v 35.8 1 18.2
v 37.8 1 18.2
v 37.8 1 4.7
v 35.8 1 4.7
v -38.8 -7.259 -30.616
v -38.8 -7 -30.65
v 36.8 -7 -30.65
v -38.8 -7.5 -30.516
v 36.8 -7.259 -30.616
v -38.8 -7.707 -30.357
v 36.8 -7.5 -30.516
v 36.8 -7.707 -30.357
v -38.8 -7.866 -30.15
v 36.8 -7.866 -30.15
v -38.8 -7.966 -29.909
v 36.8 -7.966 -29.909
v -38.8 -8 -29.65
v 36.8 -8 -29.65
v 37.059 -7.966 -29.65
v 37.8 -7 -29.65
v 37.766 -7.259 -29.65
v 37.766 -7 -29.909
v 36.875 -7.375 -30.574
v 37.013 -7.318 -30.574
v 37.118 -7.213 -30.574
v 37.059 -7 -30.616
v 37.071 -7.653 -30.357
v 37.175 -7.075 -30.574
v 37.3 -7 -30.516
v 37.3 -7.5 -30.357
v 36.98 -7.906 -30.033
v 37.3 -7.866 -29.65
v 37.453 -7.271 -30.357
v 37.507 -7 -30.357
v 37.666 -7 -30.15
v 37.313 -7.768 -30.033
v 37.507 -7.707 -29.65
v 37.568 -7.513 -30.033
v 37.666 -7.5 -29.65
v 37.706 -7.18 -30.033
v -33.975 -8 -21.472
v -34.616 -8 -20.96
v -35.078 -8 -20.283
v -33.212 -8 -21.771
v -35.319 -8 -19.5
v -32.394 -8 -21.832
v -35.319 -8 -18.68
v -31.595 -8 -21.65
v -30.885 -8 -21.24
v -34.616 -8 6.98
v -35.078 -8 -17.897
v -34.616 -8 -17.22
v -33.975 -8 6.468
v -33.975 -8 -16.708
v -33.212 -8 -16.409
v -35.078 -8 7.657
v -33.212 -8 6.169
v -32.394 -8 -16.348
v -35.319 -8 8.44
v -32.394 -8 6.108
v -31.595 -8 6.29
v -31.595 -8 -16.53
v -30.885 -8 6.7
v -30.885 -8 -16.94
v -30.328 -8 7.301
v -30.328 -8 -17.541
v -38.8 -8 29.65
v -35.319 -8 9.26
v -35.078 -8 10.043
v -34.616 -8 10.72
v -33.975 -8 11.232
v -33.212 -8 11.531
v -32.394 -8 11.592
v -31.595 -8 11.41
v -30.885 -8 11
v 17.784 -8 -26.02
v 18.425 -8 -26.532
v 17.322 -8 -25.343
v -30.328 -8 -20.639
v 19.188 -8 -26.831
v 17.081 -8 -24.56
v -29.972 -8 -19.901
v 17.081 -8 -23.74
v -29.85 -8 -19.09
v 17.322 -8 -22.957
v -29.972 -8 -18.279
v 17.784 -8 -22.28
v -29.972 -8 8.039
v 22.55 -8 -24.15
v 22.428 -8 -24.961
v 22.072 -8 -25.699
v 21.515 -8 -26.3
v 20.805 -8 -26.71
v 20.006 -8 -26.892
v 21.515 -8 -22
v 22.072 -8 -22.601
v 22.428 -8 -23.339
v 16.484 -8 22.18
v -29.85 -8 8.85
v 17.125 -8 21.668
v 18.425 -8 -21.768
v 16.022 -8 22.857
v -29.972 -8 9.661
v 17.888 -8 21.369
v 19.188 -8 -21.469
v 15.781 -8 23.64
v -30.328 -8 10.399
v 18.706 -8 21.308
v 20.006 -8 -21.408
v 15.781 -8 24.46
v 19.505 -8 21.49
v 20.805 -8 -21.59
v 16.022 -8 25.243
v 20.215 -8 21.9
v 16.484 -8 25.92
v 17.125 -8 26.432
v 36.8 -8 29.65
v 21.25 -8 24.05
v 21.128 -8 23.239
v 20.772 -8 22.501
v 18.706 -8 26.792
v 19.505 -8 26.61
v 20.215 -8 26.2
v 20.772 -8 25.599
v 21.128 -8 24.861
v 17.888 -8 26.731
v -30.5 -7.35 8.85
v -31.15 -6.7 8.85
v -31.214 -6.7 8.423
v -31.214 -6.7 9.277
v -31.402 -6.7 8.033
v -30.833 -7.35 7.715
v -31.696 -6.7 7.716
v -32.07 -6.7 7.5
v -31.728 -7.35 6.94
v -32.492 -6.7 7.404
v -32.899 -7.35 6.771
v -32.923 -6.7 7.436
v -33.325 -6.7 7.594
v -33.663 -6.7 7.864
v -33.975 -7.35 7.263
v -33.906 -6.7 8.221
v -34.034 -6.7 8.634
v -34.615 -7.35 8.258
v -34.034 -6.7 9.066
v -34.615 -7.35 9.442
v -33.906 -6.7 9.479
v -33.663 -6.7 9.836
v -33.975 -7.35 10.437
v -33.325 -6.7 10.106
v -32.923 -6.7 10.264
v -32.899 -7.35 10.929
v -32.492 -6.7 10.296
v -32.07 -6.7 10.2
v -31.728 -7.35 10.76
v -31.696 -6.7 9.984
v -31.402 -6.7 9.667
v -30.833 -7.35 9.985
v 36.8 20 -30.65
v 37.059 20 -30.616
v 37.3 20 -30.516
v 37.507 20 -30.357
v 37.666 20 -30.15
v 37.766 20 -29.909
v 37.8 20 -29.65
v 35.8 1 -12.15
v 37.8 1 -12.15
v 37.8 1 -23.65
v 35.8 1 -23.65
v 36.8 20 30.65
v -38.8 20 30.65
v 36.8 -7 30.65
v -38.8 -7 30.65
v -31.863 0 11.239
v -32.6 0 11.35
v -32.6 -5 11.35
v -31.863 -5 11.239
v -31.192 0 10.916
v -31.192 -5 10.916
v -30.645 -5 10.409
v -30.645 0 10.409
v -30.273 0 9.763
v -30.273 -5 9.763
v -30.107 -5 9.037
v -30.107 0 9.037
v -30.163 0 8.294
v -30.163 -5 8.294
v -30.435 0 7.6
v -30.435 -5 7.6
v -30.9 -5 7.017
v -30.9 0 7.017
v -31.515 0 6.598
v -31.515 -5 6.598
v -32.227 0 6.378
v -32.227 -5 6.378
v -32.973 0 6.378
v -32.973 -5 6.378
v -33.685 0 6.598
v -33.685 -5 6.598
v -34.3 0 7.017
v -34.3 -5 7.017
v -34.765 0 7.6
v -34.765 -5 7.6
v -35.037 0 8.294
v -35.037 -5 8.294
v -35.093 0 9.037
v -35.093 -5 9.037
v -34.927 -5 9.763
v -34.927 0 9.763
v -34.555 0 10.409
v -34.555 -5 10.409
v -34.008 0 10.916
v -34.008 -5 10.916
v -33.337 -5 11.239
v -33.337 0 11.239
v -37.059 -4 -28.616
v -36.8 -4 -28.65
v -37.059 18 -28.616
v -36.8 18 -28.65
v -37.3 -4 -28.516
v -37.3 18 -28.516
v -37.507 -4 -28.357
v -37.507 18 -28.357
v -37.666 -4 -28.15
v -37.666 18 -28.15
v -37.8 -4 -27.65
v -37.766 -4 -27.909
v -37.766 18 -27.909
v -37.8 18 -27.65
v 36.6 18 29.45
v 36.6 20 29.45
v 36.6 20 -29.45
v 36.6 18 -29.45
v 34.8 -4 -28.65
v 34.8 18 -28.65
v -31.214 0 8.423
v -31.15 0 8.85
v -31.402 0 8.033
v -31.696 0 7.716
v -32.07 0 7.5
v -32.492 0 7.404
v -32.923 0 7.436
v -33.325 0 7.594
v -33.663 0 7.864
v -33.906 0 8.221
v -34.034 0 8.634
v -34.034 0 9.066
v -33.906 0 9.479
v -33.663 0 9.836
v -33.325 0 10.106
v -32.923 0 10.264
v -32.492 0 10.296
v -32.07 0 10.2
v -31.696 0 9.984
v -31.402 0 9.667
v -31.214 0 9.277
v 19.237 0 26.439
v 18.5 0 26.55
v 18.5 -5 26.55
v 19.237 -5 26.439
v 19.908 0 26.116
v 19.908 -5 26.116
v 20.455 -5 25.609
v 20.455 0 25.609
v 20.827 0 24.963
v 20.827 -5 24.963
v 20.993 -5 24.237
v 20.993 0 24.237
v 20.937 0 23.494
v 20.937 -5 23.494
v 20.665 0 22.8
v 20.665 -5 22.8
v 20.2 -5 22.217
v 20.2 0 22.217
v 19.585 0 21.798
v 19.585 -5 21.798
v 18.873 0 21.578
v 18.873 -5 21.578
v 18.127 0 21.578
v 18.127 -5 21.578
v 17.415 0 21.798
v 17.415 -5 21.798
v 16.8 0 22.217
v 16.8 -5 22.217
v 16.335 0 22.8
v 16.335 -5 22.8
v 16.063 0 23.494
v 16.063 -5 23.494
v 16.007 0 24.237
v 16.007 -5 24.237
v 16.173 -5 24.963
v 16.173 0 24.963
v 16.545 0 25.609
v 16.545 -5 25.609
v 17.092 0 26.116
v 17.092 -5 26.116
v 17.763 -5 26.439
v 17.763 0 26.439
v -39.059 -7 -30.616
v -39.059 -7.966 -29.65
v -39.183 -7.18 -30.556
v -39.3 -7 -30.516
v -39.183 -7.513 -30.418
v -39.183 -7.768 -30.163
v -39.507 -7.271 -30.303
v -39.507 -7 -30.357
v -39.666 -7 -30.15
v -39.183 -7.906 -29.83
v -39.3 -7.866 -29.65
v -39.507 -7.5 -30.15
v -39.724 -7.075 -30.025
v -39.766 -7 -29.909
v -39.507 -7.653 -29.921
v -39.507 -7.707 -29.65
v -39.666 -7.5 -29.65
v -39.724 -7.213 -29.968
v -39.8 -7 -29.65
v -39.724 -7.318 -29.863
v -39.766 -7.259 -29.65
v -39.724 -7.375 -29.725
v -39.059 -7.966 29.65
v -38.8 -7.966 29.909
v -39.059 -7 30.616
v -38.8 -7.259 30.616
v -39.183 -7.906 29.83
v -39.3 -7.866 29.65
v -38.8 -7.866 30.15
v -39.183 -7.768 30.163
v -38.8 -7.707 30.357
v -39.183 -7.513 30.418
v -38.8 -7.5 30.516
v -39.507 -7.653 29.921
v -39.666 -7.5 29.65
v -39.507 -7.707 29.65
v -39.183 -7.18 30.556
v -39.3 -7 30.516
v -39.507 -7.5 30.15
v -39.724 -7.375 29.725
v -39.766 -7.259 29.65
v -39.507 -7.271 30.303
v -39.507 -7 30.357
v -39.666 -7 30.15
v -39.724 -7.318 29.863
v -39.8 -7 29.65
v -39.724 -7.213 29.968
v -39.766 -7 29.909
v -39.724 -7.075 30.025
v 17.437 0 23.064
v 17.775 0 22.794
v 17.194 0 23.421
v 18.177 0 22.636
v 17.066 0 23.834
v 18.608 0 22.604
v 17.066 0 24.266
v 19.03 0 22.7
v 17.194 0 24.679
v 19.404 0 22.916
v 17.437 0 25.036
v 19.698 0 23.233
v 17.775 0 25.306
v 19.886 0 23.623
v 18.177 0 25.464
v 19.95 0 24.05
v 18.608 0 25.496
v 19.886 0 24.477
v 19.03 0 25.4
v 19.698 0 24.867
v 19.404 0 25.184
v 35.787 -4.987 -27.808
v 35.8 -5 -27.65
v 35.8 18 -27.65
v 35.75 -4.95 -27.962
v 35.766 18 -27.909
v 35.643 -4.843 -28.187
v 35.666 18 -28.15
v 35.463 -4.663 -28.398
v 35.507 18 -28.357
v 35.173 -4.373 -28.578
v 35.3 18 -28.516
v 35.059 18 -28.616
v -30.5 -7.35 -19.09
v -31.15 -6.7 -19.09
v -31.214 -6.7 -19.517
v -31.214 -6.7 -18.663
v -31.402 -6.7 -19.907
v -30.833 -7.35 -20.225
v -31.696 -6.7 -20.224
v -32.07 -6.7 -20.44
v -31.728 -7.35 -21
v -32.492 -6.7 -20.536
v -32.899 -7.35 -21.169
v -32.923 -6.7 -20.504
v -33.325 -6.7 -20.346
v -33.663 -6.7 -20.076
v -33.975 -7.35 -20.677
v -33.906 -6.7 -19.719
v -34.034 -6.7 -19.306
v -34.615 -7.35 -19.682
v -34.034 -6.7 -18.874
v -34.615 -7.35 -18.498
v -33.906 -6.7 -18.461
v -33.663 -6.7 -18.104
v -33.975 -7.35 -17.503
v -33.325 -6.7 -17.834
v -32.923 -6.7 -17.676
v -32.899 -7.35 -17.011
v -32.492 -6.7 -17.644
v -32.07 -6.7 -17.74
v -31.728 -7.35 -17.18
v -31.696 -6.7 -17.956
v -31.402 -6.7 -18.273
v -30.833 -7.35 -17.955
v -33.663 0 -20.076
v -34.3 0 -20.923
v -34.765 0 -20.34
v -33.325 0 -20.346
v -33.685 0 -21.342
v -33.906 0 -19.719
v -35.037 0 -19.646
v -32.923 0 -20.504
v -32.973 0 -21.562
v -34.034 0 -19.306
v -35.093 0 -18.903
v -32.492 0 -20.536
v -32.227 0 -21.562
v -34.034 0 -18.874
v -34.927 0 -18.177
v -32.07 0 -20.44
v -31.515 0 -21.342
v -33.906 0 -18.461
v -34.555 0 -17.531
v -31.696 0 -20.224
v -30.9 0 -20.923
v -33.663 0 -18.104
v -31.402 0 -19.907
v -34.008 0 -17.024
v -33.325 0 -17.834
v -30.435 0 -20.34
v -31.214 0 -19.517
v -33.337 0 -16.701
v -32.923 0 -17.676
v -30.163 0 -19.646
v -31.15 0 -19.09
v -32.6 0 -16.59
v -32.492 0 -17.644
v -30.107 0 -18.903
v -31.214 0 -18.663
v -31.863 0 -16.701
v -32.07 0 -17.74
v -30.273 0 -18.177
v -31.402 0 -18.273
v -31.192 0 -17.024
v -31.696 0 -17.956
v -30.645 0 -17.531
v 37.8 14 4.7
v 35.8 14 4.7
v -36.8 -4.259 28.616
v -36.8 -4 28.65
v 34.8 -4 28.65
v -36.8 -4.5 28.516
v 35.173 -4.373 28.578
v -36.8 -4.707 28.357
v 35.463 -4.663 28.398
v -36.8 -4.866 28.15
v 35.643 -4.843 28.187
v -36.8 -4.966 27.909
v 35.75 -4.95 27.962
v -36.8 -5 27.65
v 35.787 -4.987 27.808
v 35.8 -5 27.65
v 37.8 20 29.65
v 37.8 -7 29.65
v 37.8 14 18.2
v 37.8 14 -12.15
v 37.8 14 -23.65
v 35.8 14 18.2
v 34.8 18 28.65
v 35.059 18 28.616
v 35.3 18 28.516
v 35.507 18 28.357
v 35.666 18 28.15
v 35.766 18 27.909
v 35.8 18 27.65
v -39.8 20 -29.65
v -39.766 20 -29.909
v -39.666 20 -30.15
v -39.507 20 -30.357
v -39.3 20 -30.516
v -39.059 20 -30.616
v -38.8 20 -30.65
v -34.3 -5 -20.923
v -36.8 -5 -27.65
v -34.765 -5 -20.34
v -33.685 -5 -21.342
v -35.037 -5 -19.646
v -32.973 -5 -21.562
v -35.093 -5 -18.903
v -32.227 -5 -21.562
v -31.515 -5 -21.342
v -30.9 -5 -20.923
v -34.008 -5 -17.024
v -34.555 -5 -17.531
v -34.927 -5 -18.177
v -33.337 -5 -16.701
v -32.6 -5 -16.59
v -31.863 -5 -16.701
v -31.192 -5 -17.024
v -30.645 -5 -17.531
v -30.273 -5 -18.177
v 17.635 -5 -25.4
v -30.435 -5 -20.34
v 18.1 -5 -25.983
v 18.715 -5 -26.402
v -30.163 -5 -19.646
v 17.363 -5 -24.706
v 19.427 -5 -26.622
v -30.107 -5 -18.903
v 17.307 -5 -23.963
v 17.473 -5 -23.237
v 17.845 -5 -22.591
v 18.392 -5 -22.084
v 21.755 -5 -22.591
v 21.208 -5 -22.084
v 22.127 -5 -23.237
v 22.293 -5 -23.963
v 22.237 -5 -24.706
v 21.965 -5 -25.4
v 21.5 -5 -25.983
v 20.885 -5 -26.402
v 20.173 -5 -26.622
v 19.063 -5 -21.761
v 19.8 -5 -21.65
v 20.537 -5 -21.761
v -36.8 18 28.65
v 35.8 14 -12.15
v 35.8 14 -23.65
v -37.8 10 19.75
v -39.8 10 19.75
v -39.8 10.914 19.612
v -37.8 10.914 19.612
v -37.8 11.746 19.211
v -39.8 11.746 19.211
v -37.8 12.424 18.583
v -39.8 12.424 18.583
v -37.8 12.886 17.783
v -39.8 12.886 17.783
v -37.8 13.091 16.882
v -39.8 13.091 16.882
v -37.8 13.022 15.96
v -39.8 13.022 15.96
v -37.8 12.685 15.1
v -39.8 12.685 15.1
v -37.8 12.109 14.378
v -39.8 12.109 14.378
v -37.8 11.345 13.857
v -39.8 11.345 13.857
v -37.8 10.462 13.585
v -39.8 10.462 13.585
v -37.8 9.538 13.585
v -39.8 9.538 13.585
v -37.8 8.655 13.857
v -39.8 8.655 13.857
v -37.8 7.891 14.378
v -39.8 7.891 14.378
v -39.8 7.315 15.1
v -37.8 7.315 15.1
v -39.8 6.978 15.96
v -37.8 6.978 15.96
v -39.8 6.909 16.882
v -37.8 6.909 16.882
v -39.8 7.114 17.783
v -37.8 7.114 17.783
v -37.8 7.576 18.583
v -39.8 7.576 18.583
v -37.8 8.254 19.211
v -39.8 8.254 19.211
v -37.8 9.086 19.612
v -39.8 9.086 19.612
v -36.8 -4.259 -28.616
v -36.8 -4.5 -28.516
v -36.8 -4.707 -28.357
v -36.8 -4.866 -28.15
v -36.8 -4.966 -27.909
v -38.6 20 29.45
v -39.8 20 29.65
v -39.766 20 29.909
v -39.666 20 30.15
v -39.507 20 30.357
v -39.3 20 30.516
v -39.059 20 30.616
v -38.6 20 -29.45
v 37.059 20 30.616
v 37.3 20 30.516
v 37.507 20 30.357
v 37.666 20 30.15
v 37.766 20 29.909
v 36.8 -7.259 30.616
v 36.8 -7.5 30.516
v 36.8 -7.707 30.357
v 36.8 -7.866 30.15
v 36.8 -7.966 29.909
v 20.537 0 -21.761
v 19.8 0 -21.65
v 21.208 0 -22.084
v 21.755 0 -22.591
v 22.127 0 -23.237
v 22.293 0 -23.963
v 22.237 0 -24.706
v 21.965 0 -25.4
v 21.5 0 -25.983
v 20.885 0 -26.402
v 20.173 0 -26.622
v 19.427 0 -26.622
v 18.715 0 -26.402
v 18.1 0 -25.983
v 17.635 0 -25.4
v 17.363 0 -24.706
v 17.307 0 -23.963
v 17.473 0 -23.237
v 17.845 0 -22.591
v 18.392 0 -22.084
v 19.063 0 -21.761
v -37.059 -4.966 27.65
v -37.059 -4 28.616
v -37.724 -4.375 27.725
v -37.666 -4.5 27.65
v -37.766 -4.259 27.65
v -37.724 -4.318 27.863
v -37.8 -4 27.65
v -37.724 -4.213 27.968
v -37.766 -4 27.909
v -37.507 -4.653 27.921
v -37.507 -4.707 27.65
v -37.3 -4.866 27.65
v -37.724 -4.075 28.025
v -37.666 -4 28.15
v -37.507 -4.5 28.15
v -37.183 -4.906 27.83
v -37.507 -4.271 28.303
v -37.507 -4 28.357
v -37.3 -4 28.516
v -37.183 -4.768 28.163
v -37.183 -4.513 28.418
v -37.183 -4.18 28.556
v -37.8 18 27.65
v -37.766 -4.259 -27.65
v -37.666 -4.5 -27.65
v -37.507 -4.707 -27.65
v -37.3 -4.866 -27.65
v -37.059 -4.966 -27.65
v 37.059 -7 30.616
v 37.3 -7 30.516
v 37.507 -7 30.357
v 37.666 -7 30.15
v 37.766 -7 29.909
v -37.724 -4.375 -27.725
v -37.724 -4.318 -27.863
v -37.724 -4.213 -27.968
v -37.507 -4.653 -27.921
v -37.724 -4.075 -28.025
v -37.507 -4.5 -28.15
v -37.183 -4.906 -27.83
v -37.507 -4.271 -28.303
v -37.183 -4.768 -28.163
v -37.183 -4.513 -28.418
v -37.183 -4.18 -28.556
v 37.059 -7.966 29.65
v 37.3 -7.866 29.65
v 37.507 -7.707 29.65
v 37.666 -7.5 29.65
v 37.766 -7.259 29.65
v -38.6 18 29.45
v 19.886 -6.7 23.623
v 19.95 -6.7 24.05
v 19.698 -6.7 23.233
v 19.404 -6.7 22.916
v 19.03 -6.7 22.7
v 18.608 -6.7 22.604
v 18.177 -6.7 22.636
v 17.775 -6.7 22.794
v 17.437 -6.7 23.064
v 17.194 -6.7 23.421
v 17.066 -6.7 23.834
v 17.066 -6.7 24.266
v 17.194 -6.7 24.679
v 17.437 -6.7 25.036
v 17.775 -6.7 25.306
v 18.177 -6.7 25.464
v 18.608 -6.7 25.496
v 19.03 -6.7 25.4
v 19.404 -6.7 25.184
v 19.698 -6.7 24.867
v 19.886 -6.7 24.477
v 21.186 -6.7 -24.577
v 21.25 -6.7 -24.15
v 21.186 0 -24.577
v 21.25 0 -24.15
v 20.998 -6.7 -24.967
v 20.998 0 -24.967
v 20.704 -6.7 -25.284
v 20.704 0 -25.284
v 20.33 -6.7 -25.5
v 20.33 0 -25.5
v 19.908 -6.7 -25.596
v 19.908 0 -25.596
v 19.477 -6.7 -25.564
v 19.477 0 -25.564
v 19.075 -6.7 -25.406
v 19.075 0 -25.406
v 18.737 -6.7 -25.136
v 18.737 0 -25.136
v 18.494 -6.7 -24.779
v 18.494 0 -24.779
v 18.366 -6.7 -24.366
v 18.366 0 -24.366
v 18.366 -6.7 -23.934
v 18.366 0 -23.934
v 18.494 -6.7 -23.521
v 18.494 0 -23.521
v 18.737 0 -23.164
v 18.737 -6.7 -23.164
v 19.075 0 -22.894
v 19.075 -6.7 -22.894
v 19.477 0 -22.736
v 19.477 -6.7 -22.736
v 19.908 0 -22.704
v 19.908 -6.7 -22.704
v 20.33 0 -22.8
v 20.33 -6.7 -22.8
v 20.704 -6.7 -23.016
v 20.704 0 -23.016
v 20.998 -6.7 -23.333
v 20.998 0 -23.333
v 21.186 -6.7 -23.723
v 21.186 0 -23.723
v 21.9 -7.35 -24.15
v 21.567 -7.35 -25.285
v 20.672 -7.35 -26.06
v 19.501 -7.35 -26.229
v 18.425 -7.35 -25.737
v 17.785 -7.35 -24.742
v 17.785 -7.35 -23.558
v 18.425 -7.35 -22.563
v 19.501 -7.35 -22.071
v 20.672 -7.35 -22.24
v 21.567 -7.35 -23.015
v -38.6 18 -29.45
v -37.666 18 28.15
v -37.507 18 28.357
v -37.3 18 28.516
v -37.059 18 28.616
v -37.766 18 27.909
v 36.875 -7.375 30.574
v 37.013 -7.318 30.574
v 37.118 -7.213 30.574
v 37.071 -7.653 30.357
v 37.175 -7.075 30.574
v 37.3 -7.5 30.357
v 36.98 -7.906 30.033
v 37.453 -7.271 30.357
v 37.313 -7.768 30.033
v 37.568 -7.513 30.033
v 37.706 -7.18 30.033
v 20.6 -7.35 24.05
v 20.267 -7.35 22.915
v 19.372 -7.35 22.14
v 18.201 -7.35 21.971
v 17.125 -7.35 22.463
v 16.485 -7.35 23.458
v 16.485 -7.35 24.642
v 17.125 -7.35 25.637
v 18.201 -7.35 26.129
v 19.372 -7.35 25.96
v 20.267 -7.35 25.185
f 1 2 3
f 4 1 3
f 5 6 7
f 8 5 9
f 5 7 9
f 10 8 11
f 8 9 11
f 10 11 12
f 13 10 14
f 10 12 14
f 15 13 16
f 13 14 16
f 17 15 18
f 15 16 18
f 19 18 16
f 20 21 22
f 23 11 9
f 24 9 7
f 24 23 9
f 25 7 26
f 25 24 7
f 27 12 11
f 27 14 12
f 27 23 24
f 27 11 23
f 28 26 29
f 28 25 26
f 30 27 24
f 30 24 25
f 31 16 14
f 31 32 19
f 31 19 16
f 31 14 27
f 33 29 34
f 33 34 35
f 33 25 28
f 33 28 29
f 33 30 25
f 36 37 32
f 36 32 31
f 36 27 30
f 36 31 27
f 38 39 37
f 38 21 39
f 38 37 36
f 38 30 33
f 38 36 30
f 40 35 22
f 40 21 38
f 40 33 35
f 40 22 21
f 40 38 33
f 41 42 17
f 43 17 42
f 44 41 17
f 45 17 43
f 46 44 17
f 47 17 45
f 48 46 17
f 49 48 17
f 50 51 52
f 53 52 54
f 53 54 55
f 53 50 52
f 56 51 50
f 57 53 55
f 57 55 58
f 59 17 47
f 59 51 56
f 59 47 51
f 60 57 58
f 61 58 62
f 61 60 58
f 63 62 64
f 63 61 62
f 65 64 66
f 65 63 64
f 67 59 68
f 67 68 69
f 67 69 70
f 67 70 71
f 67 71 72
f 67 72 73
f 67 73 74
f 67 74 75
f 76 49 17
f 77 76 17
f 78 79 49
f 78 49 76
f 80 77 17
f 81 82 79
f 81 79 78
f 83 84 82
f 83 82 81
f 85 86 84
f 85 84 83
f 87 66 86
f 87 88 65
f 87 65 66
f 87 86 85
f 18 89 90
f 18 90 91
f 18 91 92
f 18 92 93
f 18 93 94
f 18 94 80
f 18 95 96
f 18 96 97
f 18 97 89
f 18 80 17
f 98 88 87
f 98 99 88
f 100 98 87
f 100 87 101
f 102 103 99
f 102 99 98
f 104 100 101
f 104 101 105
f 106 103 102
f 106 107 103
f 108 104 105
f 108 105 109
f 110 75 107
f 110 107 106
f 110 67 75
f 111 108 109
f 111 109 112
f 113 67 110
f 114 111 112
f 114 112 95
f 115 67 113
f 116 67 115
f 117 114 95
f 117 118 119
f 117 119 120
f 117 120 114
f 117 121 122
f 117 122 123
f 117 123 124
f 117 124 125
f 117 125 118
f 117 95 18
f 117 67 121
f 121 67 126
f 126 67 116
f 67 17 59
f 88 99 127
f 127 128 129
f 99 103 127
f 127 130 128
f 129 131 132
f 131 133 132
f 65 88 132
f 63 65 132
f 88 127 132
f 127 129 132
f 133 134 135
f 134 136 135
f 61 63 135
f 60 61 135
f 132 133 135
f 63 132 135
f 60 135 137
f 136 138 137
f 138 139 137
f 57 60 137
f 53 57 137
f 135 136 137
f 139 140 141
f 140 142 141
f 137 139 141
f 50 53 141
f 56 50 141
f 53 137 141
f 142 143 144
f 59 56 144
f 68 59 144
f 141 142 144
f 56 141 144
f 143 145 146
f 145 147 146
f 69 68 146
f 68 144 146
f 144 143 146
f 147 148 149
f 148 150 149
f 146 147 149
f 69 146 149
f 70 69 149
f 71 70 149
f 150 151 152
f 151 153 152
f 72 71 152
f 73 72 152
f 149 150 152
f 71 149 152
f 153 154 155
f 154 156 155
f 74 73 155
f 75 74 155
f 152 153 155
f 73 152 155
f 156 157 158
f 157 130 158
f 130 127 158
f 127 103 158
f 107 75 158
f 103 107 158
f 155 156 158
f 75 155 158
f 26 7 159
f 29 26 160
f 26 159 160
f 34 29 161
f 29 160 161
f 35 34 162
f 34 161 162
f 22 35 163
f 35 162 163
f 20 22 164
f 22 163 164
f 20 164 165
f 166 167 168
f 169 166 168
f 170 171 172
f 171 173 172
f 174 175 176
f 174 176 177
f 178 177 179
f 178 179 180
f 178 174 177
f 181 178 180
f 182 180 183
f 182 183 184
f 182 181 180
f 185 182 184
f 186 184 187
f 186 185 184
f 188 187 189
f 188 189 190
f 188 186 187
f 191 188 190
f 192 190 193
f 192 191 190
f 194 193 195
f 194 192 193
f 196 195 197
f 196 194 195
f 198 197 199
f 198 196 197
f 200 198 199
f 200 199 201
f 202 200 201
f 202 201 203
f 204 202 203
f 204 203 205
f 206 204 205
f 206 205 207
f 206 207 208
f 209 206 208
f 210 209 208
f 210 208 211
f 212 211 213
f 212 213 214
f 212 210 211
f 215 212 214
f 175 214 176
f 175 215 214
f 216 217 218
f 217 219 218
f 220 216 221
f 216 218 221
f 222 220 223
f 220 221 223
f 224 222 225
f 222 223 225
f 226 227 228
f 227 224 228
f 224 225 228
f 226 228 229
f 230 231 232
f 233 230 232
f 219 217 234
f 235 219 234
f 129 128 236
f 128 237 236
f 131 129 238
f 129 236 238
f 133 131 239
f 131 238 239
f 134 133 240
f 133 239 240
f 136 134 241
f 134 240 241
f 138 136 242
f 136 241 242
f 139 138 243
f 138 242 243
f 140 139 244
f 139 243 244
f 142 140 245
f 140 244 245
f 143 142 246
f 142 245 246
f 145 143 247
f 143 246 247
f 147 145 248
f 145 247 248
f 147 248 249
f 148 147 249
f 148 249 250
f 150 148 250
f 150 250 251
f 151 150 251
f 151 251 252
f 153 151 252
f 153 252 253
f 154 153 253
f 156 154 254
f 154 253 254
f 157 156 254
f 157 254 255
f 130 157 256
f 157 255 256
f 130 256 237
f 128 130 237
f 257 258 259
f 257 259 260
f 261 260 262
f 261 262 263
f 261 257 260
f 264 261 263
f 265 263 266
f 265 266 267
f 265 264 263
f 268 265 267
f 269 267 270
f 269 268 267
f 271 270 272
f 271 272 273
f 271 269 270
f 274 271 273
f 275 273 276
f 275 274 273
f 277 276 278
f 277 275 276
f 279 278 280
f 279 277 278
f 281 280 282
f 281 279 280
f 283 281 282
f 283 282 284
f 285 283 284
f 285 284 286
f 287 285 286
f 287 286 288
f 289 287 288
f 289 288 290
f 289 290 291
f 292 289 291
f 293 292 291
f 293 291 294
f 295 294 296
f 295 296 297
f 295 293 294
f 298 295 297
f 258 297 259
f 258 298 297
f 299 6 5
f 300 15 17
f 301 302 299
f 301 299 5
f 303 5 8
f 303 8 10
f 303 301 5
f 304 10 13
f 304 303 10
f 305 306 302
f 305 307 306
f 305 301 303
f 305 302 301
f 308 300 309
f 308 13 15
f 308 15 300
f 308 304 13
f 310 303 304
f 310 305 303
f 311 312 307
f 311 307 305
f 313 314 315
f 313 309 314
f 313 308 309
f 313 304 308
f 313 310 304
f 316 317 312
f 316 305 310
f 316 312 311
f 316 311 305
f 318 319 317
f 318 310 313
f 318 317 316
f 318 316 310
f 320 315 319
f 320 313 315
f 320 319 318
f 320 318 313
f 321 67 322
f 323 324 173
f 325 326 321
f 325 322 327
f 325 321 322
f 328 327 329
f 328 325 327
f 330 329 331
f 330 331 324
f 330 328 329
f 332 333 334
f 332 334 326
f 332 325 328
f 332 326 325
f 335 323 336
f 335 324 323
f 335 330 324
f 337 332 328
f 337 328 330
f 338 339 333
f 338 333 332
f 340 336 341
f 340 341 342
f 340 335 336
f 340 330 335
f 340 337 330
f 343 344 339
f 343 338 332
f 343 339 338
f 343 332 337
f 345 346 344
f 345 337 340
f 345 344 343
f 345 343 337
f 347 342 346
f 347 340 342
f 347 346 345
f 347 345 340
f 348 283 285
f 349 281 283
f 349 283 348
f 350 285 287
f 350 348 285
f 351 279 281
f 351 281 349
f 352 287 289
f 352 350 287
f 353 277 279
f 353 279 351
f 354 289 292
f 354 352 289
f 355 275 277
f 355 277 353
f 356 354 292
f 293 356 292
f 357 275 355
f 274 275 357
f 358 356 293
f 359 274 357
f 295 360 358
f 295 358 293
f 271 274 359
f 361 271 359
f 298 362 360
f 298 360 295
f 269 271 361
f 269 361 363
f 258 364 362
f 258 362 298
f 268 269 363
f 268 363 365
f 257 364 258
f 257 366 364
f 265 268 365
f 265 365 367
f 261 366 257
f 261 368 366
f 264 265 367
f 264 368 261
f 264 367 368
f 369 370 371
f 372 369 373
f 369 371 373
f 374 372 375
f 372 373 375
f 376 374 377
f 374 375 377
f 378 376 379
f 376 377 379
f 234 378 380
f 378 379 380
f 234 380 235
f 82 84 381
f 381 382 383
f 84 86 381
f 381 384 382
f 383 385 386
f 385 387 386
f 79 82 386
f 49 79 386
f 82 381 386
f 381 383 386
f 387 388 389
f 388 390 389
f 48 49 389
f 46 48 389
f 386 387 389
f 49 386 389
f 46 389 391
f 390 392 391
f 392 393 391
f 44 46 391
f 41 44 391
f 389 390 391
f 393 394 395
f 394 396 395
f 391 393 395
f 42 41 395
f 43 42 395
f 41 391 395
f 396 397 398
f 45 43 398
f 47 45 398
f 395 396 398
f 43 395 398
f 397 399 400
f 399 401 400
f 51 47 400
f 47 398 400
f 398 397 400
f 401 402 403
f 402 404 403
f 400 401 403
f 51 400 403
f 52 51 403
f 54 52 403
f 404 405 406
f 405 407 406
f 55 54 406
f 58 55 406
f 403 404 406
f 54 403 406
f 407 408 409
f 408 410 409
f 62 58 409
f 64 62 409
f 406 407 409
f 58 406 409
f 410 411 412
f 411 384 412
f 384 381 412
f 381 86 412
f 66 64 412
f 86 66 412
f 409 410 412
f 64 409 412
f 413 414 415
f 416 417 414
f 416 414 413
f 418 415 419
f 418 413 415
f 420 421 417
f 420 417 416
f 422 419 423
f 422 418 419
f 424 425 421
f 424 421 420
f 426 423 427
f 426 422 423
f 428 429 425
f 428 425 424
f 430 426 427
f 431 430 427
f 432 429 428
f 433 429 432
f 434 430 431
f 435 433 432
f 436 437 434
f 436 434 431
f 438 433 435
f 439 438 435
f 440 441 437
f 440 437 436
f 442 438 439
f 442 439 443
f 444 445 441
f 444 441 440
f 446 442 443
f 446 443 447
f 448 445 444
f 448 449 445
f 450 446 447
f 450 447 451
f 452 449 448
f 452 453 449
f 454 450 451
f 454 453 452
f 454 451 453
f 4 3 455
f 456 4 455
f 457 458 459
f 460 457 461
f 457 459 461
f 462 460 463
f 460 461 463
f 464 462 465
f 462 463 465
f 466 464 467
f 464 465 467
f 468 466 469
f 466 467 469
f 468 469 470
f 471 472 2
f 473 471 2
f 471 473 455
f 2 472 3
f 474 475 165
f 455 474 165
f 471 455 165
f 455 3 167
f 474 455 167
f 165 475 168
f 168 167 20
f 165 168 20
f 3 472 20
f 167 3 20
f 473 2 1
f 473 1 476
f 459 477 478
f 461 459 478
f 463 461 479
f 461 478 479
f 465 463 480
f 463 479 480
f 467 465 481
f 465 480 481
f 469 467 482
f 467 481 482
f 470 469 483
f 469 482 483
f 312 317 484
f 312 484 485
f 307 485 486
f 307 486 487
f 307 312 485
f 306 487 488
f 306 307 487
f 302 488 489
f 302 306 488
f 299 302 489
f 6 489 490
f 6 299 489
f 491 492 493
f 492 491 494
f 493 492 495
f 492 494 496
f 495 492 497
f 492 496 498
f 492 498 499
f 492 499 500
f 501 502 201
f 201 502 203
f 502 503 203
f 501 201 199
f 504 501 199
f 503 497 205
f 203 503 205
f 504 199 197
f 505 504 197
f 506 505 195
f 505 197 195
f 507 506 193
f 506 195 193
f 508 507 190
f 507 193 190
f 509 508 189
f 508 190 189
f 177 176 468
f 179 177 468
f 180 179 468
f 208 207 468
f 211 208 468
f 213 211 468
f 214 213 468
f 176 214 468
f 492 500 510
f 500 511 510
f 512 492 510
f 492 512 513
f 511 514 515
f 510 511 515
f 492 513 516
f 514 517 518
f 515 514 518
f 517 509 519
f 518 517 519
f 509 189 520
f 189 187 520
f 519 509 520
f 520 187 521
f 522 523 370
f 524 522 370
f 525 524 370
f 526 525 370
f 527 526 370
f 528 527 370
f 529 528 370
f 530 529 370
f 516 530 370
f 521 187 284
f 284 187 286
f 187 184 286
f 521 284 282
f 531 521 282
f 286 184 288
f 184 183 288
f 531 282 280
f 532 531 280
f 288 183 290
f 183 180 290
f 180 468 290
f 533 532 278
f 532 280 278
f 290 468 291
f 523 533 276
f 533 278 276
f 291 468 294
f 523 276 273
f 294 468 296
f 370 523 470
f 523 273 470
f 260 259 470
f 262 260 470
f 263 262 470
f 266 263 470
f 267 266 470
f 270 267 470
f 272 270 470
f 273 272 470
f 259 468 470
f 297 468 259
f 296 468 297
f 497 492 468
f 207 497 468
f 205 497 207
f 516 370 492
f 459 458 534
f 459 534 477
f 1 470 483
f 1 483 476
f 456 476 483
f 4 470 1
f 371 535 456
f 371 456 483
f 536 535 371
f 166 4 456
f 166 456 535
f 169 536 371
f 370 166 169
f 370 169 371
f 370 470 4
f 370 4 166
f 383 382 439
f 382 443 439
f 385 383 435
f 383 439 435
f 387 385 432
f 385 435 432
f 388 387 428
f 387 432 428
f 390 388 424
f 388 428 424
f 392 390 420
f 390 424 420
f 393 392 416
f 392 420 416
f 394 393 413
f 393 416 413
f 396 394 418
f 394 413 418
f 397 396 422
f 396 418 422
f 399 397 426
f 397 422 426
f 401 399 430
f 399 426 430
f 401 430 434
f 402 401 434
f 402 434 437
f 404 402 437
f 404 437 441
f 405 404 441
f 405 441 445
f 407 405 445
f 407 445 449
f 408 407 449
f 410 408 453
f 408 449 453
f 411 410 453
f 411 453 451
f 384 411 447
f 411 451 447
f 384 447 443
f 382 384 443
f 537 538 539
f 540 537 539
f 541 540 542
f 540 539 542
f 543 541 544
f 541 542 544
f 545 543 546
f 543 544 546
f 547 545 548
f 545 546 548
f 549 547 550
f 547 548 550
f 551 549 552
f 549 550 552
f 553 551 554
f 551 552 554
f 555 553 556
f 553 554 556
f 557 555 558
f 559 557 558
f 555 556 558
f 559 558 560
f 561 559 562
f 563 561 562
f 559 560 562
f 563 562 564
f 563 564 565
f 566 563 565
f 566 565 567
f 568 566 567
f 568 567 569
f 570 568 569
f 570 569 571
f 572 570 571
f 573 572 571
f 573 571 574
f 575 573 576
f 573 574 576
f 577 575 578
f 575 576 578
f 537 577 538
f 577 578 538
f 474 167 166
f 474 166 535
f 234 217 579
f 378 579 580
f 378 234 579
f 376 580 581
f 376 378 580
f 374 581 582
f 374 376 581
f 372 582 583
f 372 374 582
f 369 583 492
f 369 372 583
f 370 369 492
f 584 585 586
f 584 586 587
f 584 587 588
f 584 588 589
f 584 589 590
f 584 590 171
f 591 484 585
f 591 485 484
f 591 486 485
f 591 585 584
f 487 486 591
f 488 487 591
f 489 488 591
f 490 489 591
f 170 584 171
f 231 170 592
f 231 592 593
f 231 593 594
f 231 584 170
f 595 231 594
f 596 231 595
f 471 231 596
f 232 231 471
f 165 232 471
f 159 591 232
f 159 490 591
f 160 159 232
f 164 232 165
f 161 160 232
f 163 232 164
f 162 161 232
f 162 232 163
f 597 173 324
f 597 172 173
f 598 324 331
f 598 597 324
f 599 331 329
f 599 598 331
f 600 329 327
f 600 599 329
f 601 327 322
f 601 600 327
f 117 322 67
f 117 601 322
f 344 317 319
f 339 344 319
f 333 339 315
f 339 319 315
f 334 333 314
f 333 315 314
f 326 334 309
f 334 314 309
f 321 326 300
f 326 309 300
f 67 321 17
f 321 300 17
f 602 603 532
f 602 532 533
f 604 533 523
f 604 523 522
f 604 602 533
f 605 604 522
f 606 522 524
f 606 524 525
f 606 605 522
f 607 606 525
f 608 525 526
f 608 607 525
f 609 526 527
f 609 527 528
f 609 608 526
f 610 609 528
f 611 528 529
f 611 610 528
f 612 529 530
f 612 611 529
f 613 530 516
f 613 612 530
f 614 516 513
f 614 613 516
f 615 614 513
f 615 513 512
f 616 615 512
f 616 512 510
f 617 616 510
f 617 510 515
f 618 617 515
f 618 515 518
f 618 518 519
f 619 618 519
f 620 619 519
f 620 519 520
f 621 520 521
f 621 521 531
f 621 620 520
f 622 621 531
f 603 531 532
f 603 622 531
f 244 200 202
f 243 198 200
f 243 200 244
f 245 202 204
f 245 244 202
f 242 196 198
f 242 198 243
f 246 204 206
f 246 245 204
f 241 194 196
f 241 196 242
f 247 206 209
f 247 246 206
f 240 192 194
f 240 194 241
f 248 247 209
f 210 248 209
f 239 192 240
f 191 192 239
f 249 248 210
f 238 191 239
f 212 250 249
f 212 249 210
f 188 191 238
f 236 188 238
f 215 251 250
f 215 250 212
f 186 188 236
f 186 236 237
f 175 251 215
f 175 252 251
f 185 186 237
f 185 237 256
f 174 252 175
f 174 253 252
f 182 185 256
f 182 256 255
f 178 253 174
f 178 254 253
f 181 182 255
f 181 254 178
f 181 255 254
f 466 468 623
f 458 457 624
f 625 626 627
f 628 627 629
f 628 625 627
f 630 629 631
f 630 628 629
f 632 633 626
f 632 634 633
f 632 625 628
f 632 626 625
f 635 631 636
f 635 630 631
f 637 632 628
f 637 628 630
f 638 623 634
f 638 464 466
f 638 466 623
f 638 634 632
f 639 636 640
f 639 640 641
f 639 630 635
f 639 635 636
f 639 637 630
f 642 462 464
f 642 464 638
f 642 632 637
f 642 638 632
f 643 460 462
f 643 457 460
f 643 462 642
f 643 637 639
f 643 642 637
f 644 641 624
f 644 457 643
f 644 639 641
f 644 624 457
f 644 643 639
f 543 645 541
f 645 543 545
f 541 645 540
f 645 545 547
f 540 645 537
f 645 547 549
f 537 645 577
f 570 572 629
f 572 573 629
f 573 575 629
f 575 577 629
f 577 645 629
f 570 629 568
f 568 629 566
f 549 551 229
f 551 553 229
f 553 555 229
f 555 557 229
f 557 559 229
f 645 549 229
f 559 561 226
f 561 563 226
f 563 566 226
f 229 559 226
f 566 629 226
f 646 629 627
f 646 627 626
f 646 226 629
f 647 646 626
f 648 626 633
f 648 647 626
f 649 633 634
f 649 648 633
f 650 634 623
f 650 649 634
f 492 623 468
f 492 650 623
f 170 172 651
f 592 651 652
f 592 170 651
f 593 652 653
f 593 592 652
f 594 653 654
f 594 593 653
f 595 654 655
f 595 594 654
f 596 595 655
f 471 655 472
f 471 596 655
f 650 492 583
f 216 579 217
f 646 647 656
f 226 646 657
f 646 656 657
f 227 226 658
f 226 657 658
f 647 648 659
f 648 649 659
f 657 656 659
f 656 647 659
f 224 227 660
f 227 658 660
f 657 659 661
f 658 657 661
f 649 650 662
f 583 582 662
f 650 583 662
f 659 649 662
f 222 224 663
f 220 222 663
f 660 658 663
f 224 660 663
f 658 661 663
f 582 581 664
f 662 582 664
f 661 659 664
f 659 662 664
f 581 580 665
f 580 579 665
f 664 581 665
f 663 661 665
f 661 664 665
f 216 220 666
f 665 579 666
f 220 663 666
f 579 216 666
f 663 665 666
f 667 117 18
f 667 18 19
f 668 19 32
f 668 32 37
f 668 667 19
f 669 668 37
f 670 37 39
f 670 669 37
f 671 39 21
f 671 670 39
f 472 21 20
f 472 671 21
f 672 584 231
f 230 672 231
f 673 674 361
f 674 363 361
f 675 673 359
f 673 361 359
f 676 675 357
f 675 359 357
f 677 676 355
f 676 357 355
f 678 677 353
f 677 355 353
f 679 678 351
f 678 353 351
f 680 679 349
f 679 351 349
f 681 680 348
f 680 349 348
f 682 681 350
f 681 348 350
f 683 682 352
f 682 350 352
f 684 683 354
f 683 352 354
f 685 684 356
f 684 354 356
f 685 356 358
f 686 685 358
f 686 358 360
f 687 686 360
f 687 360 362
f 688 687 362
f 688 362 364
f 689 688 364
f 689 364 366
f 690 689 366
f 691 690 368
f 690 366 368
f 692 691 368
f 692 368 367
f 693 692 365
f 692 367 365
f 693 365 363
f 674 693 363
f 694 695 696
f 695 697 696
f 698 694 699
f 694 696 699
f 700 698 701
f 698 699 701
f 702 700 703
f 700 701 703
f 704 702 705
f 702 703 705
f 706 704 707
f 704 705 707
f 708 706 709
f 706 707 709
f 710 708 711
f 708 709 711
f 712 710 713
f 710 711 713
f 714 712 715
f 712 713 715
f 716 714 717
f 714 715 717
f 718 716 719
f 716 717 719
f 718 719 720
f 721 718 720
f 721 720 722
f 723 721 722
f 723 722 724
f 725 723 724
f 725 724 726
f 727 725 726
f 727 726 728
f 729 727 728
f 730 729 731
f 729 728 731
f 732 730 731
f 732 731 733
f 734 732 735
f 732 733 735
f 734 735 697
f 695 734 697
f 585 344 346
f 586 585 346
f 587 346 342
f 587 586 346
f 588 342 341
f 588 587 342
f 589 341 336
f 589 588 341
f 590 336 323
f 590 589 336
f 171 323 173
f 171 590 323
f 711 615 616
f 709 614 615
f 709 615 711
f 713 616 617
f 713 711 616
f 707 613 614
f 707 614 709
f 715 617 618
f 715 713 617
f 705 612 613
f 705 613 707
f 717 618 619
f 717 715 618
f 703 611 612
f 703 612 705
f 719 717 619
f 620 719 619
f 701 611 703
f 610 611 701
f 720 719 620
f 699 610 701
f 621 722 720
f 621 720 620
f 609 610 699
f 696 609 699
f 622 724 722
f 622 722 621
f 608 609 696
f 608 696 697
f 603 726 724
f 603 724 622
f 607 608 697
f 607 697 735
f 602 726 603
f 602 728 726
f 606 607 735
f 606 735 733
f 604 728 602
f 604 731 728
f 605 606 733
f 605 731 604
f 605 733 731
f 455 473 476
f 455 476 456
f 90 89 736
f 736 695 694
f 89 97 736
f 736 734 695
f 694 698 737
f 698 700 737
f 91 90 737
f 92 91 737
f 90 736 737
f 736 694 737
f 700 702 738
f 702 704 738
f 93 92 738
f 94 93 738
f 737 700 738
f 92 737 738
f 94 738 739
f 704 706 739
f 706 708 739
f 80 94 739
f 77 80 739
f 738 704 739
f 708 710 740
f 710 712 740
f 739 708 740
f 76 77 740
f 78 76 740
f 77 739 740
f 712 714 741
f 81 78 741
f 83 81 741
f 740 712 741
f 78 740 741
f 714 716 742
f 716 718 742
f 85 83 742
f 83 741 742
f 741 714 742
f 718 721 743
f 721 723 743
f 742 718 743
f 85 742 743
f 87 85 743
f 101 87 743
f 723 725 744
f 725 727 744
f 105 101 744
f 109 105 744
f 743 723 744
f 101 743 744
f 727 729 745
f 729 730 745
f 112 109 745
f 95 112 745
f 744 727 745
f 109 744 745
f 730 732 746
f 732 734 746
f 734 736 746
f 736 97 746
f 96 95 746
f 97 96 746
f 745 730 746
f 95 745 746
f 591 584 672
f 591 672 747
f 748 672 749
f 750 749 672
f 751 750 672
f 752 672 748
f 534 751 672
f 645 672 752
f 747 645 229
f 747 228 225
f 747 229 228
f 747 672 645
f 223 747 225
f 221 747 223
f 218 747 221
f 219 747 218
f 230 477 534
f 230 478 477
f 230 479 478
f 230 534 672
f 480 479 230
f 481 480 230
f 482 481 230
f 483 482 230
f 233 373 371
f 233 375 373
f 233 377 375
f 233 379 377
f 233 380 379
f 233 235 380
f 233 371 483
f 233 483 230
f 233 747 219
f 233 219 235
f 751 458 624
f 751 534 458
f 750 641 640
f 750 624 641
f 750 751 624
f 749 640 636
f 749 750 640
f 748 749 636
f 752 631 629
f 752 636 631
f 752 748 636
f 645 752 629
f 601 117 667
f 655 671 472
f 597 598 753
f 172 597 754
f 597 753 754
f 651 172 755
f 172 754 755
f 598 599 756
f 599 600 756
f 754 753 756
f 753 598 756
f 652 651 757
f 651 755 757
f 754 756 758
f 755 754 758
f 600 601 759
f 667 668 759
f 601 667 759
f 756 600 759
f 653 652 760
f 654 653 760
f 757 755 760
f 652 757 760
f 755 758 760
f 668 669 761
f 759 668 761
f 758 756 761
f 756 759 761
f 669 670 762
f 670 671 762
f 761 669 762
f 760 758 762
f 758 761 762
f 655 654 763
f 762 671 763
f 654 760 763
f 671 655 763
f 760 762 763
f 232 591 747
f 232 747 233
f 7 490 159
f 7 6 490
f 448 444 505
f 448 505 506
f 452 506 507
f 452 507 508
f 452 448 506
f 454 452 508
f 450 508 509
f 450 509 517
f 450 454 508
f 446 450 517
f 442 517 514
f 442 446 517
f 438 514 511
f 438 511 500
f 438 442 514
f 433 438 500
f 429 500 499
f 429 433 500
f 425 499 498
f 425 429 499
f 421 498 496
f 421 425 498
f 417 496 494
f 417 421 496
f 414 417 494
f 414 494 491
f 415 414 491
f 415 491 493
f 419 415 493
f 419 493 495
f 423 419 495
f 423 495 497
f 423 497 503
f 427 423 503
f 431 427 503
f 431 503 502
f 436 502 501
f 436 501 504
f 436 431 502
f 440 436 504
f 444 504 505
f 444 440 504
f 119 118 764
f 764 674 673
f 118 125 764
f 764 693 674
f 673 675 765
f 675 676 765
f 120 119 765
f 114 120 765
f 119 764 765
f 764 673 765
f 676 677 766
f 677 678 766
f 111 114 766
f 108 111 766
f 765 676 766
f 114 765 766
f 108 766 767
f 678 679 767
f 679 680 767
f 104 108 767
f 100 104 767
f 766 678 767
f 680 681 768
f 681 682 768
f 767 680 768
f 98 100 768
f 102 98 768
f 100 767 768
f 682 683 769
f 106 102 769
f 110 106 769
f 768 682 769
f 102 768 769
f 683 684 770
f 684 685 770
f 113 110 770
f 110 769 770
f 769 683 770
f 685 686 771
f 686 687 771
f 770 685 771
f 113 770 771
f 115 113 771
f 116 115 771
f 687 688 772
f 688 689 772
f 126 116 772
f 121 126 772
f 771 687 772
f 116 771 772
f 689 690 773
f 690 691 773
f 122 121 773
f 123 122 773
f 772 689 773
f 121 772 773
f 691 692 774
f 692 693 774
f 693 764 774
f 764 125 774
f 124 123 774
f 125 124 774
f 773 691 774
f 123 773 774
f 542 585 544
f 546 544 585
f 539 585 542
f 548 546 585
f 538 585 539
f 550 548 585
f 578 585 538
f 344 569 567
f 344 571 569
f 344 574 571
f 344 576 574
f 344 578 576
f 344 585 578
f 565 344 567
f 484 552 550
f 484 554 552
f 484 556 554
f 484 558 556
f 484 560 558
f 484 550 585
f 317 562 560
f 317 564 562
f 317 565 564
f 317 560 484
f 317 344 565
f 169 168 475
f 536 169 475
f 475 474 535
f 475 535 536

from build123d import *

# Parameters (mm, degrees)
SKETCH1_R                                         = 2.5
BOSS_EXTRUDE1_DEPTH                               = 5
BOSS_EXTRUDE1_2_DEPTH                             = 5
BOSS_EXTRUDE1_3_DEPTH                             = 5
BOSS_EXTRUDE1_4_DEPTH                             = 5
SKETCH3_W                                         = 77.6
SKETCH3_H                                         = 61.3
BOSS_EXTRUDE2_DEPTH                               = 3
SKETCH4_W                                         = 77.6
SKETCH4_H                                         = 61.3
SKETCH4_W_2                                       = 73.6
SKETCH4_H_2                                       = 57.3
BOSS_EXTRUDE3_DEPTH                               = 25
CUT_EXTRUDE2_REACH                                = 87.797
SKETCH5_W                                         = 13.5
SKETCH5_H                                         = 13
SKETCH5_W_2                                       = 11.5
FILLET1_R                                         = 1
SKETCH7_W                                         = 75.2
SKETCH7_H                                         = 58.9
CUT_EXTRUDE3_DEPTH                                = 2
SKETCH2_R                                         = 1
CUT_EXTRUDE1_DEPTH                                = 55.069053071
CSK_FOR_M2_5_FLAT_HEAD_MACHINE_SCREW1_D           = 2.9
CSK_FOR_M2_5_FLAT_HEAD_MACHINE_SCREW1_CSINK_D     = 5.5
CSK_FOR_M2_5_FLAT_HEAD_MACHINE_SCREW1_CSINK_ANGLE = 90
SKETCH12_R                                        = 3.1
CUT_EXTRUDE4_DEPTH                                = 2
FILLET3_R                                         = 1
FILLET4_R                                         = 1


with BuildPart() as part:
    # Sketch1 → Boss-Extrude1 (new body)
    with BuildSketch(Plane(origin=(0, 0, 0), x_dir=(1, 0, 0), z_dir=(0, 1, 0))):
        with Locations(Location((-32.6, 19.09, 0), (0, 0, 270))):
            Circle(SKETCH1_R)
    extrude(amount=-BOSS_EXTRUDE1_DEPTH)



with BuildPart() as body_2:
    # Sketch1 → Boss-Extrude1 2 (new body)
    with BuildSketch(Plane(origin=(0, 0, 0), x_dir=(1, 0, 0), z_dir=(0, 1, 0))):
        with Locations(Location((-32.6, -8.85, 0), (0, 0, 270))):
            Circle(SKETCH1_R)
    extrude(amount=-BOSS_EXTRUDE1_2_DEPTH)


with BuildPart() as body_3:
    # Sketch1 → Boss-Extrude1 3 (new body)
    with BuildSketch(Plane(origin=(0, 0, 0), x_dir=(1, 0, 0), z_dir=(0, 1, 0))):
        with Locations(Location((19.8, 24.15, 0), (0, 0, 270))):
            Circle(SKETCH1_R)
    extrude(amount=-BOSS_EXTRUDE1_3_DEPTH)


with BuildPart() as body_4:
    # Sketch1 → Boss-Extrude1 4 (new body)
    with BuildSketch(Plane(origin=(0, 0, 0), x_dir=(1, 0, 0), z_dir=(0, 1, 0))):
        with Locations(Location((18.5, -24.05, 0), (0, 0, 270))):
            Circle(SKETCH1_R)
    extrude(amount=-BOSS_EXTRUDE1_4_DEPTH)


with BuildPart() as part_1:
    add(part.part)

    add(body_2.part)  # Boss-Extrude2 merges body 2

    add(body_3.part)  # Boss-Extrude2 merges body 3

    add(body_4.part)  # Boss-Extrude2 merges body 4
    # Sketch3 → Boss-Extrude2 (add)
    with BuildSketch(Plane.XZ.offset(5)):
        with Locations((-1, 0)):
            Rectangle(SKETCH3_W, SKETCH3_H)
    extrude(amount=BOSS_EXTRUDE2_DEPTH)

    # Sketch4 → Boss-Extrude3 (add)
    with BuildSketch(Plane(origin=(0, -5, 0), x_dir=(1, 0, 0), z_dir=(0, 1, 0))):
        with Locations((-1, 0)):
            Rectangle(SKETCH4_W, SKETCH4_H)
        with Locations((-1, 0)):
            Rectangle(SKETCH4_W_2, SKETCH4_H_2, mode=Mode.SUBTRACT)
    extrude(amount=BOSS_EXTRUDE3_DEPTH)

    # Sketch5 → Cut-Extrude2 (cut, up to next)
    with BuildSketch(Plane(origin=(37.8, 0, 0), x_dir=(0, 0, -1), z_dir=(1, 0, 0)), mode=Mode.PRIVATE) as cut_extrude2_sk1:
        with Locations((-11.45, 7.5)):
            Rectangle(SKETCH5_W, SKETCH5_H)
    cut_extrude2_tool1 = extrude(cut_extrude2_sk1.sketch, amount=-CUT_EXTRUDE2_REACH, mode=Mode.PRIVATE) & part_1.part
    # Sketch5 → Cut-Extrude2 (cut, up to next)
    with BuildSketch(Plane(origin=(37.8, 0, 0), x_dir=(0, 0, -1), z_dir=(1, 0, 0)), mode=Mode.PRIVATE) as cut_extrude2_sk2:
        with Locations((17.9, 7.5)):
            Rectangle(SKETCH5_W_2, SKETCH5_H)
    cut_extrude2_tool2 = extrude(cut_extrude2_sk2.sketch, amount=-CUT_EXTRUDE2_REACH, mode=Mode.PRIVATE) & part_1.part
    add(cut_extrude2_tool1.solids().sort_by_distance((37.8, 7.5, 11.45))[0], mode=Mode.SUBTRACT)
    add(cut_extrude2_tool2.solids().sort_by_distance((37.8, 7.5, -17.9))[0], mode=Mode.SUBTRACT)

    # Fillet1
    fillet1_edges = [part_1.edges().sort_by_distance(p)[0] for p in [
        (-1, -5, 28.65),
        (-1, -5, -28.65),
        (-37.8, -5, 0),
        (35.8, 7.5, -28.65),
        (-37.8, 7.5, -28.65),
        (-37.8, 7.5, 28.65),
        (35.8, 7.5, 28.65),
        (37.8, -8, 0),
    ]]
    fillet(fillet1_edges, radius=FILLET1_R)

    # Sketch7 → Cut-Extrude3 (cut)
    with BuildSketch(Plane(origin=(0, 20, 0), x_dir=(1, 0, 0), z_dir=(0, 1, 0))):
        with Locations((-1, 0)):
            Rectangle(SKETCH7_W, SKETCH7_H)
    extrude(amount=-CUT_EXTRUDE3_DEPTH, mode=Mode.SUBTRACT)

    # Sketch2 → Cut-Extrude1 (cut, through all)
    with BuildSketch(Plane(origin=(0, 0, 0), x_dir=(1, 0, 0), z_dir=(0, 1, 0))):
        with Locations(Location((-32.6, -8.85, 0), (0, 0, 270))):
            Circle(SKETCH2_R)
        with Locations(Location((-32.6, 19.09, 0), (0, 0, 270))):
            Circle(SKETCH2_R)
        with Locations(Location((19.8, 24.15, 0), (0, 0, 270))):
            Circle(SKETCH2_R)
        with Locations(Location((18.5, -24.05, 0), (0, 0, 270))):
            Circle(SKETCH2_R)
    extrude(amount=-CUT_EXTRUDE1_DEPTH, mode=Mode.SUBTRACT)

    # CSK for M2.5 Flat Head Machine Screw1 (through all)
    with Locations(Plane(origin=(0, -8, 0), x_dir=(-1, 0, 0), z_dir=(0, -1, 0))):
        with Locations((32.6, 19.09), (32.6, -8.85), (-18.5, -24.05), (-19.8, 24.15)):
            CounterSinkHole(CSK_FOR_M2_5_FLAT_HEAD_MACHINE_SCREW1_D / 2, CSK_FOR_M2_5_FLAT_HEAD_MACHINE_SCREW1_CSINK_D / 2, counter_sink_angle=CSK_FOR_M2_5_FLAT_HEAD_MACHINE_SCREW1_CSINK_ANGLE)

    # Sketch12 → Cut-Extrude4 (cut)
    with BuildSketch(Plane.ZY.offset(39.8)):
        with Locations((16.65, 10)):
            Circle(SKETCH12_R)
    extrude(amount=-CUT_EXTRUDE4_DEPTH, mode=Mode.SUBTRACT)

    # Fillet3
    fillet3_edges = [part_1.edges().sort_by_distance(p)[0] for p in [
        (-39.8, 6, 30.65),
        (-39.8, 6, -30.65),
        (-1.5, -8, -30.65),
        (-1.5, -8, 30.65),
        (37.8, 6.5, 30.65),
        (37.507106781, -7.707106781, 30.65),
        (37.8, 6.5, -30.65),
        (37.507106781, -7.707106781, -30.65),
    ]]
    fillet(fillet3_edges, radius=FILLET3_R)

    # Fillet4
    # the kernel refuses this fillet: 1 mm, written as the material it takes off along each edge
    with BuildSketch(Plane(origin=(-38.8, -7, -29.65), x_dir=(0, -1, 0), z_dir=(-1, 0, 0))) as fillet4_piece_1_section:
        Polygon((0, 0), (FILLET4_R, 0), (FILLET4_R, -FILLET4_R), (0, -FILLET4_R), align=None)
    fillet4_piece_1 = extrude(amount=FILLET4_R, mode=Mode.PRIVATE)
    fillet4_piece_1 = fillet4_piece_1 - Plane(origin=(-38.8, -7, -29.65), x_dir=(0, 0.7071067811865475, 0.7071067811865475), z_dir=(-1, 0, 0)) * Sphere(FILLET4_R, mode=Mode.PRIVATE)
    add(fillet4_piece_1, mode=Mode.SUBTRACT)
    with BuildSketch(Plane(origin=(-38.8, -7, 29.65), x_dir=(0, -1, 0), z_dir=(-1, 0, 0))) as fillet4_piece_2_section:
        Polygon((0, 0), (FILLET4_R, 0), (FILLET4_R, FILLET4_R), (0, FILLET4_R), align=None)
    fillet4_piece_2 = extrude(amount=FILLET4_R, mode=Mode.PRIVATE)
    fillet4_piece_2 = fillet4_piece_2 - Plane(origin=(-38.8, -7, 29.65), x_dir=(0, 0.7071067811865475, -0.7071067811865475), z_dir=(-1, 0, 0)) * Sphere(FILLET4_R, mode=Mode.PRIVATE)
    add(fillet4_piece_2, mode=Mode.SUBTRACT)
    with BuildSketch(Plane(origin=(-39.8, -8, -29.65), x_dir=(0, 1, 0), z_dir=(0, 0, 1))) as fillet4_piece_3:
        with BuildLine():
            CenterArc((FILLET4_R, -FILLET4_R), FILLET4_R, 90, 90)
            Line((0, -FILLET4_R), (0, 0))
            Line((0, 0), (FILLET4_R, 0))
        make_face()
    extrude(amount=59.3, mode=Mode.SUBTRACT)


solid = part_1.part
